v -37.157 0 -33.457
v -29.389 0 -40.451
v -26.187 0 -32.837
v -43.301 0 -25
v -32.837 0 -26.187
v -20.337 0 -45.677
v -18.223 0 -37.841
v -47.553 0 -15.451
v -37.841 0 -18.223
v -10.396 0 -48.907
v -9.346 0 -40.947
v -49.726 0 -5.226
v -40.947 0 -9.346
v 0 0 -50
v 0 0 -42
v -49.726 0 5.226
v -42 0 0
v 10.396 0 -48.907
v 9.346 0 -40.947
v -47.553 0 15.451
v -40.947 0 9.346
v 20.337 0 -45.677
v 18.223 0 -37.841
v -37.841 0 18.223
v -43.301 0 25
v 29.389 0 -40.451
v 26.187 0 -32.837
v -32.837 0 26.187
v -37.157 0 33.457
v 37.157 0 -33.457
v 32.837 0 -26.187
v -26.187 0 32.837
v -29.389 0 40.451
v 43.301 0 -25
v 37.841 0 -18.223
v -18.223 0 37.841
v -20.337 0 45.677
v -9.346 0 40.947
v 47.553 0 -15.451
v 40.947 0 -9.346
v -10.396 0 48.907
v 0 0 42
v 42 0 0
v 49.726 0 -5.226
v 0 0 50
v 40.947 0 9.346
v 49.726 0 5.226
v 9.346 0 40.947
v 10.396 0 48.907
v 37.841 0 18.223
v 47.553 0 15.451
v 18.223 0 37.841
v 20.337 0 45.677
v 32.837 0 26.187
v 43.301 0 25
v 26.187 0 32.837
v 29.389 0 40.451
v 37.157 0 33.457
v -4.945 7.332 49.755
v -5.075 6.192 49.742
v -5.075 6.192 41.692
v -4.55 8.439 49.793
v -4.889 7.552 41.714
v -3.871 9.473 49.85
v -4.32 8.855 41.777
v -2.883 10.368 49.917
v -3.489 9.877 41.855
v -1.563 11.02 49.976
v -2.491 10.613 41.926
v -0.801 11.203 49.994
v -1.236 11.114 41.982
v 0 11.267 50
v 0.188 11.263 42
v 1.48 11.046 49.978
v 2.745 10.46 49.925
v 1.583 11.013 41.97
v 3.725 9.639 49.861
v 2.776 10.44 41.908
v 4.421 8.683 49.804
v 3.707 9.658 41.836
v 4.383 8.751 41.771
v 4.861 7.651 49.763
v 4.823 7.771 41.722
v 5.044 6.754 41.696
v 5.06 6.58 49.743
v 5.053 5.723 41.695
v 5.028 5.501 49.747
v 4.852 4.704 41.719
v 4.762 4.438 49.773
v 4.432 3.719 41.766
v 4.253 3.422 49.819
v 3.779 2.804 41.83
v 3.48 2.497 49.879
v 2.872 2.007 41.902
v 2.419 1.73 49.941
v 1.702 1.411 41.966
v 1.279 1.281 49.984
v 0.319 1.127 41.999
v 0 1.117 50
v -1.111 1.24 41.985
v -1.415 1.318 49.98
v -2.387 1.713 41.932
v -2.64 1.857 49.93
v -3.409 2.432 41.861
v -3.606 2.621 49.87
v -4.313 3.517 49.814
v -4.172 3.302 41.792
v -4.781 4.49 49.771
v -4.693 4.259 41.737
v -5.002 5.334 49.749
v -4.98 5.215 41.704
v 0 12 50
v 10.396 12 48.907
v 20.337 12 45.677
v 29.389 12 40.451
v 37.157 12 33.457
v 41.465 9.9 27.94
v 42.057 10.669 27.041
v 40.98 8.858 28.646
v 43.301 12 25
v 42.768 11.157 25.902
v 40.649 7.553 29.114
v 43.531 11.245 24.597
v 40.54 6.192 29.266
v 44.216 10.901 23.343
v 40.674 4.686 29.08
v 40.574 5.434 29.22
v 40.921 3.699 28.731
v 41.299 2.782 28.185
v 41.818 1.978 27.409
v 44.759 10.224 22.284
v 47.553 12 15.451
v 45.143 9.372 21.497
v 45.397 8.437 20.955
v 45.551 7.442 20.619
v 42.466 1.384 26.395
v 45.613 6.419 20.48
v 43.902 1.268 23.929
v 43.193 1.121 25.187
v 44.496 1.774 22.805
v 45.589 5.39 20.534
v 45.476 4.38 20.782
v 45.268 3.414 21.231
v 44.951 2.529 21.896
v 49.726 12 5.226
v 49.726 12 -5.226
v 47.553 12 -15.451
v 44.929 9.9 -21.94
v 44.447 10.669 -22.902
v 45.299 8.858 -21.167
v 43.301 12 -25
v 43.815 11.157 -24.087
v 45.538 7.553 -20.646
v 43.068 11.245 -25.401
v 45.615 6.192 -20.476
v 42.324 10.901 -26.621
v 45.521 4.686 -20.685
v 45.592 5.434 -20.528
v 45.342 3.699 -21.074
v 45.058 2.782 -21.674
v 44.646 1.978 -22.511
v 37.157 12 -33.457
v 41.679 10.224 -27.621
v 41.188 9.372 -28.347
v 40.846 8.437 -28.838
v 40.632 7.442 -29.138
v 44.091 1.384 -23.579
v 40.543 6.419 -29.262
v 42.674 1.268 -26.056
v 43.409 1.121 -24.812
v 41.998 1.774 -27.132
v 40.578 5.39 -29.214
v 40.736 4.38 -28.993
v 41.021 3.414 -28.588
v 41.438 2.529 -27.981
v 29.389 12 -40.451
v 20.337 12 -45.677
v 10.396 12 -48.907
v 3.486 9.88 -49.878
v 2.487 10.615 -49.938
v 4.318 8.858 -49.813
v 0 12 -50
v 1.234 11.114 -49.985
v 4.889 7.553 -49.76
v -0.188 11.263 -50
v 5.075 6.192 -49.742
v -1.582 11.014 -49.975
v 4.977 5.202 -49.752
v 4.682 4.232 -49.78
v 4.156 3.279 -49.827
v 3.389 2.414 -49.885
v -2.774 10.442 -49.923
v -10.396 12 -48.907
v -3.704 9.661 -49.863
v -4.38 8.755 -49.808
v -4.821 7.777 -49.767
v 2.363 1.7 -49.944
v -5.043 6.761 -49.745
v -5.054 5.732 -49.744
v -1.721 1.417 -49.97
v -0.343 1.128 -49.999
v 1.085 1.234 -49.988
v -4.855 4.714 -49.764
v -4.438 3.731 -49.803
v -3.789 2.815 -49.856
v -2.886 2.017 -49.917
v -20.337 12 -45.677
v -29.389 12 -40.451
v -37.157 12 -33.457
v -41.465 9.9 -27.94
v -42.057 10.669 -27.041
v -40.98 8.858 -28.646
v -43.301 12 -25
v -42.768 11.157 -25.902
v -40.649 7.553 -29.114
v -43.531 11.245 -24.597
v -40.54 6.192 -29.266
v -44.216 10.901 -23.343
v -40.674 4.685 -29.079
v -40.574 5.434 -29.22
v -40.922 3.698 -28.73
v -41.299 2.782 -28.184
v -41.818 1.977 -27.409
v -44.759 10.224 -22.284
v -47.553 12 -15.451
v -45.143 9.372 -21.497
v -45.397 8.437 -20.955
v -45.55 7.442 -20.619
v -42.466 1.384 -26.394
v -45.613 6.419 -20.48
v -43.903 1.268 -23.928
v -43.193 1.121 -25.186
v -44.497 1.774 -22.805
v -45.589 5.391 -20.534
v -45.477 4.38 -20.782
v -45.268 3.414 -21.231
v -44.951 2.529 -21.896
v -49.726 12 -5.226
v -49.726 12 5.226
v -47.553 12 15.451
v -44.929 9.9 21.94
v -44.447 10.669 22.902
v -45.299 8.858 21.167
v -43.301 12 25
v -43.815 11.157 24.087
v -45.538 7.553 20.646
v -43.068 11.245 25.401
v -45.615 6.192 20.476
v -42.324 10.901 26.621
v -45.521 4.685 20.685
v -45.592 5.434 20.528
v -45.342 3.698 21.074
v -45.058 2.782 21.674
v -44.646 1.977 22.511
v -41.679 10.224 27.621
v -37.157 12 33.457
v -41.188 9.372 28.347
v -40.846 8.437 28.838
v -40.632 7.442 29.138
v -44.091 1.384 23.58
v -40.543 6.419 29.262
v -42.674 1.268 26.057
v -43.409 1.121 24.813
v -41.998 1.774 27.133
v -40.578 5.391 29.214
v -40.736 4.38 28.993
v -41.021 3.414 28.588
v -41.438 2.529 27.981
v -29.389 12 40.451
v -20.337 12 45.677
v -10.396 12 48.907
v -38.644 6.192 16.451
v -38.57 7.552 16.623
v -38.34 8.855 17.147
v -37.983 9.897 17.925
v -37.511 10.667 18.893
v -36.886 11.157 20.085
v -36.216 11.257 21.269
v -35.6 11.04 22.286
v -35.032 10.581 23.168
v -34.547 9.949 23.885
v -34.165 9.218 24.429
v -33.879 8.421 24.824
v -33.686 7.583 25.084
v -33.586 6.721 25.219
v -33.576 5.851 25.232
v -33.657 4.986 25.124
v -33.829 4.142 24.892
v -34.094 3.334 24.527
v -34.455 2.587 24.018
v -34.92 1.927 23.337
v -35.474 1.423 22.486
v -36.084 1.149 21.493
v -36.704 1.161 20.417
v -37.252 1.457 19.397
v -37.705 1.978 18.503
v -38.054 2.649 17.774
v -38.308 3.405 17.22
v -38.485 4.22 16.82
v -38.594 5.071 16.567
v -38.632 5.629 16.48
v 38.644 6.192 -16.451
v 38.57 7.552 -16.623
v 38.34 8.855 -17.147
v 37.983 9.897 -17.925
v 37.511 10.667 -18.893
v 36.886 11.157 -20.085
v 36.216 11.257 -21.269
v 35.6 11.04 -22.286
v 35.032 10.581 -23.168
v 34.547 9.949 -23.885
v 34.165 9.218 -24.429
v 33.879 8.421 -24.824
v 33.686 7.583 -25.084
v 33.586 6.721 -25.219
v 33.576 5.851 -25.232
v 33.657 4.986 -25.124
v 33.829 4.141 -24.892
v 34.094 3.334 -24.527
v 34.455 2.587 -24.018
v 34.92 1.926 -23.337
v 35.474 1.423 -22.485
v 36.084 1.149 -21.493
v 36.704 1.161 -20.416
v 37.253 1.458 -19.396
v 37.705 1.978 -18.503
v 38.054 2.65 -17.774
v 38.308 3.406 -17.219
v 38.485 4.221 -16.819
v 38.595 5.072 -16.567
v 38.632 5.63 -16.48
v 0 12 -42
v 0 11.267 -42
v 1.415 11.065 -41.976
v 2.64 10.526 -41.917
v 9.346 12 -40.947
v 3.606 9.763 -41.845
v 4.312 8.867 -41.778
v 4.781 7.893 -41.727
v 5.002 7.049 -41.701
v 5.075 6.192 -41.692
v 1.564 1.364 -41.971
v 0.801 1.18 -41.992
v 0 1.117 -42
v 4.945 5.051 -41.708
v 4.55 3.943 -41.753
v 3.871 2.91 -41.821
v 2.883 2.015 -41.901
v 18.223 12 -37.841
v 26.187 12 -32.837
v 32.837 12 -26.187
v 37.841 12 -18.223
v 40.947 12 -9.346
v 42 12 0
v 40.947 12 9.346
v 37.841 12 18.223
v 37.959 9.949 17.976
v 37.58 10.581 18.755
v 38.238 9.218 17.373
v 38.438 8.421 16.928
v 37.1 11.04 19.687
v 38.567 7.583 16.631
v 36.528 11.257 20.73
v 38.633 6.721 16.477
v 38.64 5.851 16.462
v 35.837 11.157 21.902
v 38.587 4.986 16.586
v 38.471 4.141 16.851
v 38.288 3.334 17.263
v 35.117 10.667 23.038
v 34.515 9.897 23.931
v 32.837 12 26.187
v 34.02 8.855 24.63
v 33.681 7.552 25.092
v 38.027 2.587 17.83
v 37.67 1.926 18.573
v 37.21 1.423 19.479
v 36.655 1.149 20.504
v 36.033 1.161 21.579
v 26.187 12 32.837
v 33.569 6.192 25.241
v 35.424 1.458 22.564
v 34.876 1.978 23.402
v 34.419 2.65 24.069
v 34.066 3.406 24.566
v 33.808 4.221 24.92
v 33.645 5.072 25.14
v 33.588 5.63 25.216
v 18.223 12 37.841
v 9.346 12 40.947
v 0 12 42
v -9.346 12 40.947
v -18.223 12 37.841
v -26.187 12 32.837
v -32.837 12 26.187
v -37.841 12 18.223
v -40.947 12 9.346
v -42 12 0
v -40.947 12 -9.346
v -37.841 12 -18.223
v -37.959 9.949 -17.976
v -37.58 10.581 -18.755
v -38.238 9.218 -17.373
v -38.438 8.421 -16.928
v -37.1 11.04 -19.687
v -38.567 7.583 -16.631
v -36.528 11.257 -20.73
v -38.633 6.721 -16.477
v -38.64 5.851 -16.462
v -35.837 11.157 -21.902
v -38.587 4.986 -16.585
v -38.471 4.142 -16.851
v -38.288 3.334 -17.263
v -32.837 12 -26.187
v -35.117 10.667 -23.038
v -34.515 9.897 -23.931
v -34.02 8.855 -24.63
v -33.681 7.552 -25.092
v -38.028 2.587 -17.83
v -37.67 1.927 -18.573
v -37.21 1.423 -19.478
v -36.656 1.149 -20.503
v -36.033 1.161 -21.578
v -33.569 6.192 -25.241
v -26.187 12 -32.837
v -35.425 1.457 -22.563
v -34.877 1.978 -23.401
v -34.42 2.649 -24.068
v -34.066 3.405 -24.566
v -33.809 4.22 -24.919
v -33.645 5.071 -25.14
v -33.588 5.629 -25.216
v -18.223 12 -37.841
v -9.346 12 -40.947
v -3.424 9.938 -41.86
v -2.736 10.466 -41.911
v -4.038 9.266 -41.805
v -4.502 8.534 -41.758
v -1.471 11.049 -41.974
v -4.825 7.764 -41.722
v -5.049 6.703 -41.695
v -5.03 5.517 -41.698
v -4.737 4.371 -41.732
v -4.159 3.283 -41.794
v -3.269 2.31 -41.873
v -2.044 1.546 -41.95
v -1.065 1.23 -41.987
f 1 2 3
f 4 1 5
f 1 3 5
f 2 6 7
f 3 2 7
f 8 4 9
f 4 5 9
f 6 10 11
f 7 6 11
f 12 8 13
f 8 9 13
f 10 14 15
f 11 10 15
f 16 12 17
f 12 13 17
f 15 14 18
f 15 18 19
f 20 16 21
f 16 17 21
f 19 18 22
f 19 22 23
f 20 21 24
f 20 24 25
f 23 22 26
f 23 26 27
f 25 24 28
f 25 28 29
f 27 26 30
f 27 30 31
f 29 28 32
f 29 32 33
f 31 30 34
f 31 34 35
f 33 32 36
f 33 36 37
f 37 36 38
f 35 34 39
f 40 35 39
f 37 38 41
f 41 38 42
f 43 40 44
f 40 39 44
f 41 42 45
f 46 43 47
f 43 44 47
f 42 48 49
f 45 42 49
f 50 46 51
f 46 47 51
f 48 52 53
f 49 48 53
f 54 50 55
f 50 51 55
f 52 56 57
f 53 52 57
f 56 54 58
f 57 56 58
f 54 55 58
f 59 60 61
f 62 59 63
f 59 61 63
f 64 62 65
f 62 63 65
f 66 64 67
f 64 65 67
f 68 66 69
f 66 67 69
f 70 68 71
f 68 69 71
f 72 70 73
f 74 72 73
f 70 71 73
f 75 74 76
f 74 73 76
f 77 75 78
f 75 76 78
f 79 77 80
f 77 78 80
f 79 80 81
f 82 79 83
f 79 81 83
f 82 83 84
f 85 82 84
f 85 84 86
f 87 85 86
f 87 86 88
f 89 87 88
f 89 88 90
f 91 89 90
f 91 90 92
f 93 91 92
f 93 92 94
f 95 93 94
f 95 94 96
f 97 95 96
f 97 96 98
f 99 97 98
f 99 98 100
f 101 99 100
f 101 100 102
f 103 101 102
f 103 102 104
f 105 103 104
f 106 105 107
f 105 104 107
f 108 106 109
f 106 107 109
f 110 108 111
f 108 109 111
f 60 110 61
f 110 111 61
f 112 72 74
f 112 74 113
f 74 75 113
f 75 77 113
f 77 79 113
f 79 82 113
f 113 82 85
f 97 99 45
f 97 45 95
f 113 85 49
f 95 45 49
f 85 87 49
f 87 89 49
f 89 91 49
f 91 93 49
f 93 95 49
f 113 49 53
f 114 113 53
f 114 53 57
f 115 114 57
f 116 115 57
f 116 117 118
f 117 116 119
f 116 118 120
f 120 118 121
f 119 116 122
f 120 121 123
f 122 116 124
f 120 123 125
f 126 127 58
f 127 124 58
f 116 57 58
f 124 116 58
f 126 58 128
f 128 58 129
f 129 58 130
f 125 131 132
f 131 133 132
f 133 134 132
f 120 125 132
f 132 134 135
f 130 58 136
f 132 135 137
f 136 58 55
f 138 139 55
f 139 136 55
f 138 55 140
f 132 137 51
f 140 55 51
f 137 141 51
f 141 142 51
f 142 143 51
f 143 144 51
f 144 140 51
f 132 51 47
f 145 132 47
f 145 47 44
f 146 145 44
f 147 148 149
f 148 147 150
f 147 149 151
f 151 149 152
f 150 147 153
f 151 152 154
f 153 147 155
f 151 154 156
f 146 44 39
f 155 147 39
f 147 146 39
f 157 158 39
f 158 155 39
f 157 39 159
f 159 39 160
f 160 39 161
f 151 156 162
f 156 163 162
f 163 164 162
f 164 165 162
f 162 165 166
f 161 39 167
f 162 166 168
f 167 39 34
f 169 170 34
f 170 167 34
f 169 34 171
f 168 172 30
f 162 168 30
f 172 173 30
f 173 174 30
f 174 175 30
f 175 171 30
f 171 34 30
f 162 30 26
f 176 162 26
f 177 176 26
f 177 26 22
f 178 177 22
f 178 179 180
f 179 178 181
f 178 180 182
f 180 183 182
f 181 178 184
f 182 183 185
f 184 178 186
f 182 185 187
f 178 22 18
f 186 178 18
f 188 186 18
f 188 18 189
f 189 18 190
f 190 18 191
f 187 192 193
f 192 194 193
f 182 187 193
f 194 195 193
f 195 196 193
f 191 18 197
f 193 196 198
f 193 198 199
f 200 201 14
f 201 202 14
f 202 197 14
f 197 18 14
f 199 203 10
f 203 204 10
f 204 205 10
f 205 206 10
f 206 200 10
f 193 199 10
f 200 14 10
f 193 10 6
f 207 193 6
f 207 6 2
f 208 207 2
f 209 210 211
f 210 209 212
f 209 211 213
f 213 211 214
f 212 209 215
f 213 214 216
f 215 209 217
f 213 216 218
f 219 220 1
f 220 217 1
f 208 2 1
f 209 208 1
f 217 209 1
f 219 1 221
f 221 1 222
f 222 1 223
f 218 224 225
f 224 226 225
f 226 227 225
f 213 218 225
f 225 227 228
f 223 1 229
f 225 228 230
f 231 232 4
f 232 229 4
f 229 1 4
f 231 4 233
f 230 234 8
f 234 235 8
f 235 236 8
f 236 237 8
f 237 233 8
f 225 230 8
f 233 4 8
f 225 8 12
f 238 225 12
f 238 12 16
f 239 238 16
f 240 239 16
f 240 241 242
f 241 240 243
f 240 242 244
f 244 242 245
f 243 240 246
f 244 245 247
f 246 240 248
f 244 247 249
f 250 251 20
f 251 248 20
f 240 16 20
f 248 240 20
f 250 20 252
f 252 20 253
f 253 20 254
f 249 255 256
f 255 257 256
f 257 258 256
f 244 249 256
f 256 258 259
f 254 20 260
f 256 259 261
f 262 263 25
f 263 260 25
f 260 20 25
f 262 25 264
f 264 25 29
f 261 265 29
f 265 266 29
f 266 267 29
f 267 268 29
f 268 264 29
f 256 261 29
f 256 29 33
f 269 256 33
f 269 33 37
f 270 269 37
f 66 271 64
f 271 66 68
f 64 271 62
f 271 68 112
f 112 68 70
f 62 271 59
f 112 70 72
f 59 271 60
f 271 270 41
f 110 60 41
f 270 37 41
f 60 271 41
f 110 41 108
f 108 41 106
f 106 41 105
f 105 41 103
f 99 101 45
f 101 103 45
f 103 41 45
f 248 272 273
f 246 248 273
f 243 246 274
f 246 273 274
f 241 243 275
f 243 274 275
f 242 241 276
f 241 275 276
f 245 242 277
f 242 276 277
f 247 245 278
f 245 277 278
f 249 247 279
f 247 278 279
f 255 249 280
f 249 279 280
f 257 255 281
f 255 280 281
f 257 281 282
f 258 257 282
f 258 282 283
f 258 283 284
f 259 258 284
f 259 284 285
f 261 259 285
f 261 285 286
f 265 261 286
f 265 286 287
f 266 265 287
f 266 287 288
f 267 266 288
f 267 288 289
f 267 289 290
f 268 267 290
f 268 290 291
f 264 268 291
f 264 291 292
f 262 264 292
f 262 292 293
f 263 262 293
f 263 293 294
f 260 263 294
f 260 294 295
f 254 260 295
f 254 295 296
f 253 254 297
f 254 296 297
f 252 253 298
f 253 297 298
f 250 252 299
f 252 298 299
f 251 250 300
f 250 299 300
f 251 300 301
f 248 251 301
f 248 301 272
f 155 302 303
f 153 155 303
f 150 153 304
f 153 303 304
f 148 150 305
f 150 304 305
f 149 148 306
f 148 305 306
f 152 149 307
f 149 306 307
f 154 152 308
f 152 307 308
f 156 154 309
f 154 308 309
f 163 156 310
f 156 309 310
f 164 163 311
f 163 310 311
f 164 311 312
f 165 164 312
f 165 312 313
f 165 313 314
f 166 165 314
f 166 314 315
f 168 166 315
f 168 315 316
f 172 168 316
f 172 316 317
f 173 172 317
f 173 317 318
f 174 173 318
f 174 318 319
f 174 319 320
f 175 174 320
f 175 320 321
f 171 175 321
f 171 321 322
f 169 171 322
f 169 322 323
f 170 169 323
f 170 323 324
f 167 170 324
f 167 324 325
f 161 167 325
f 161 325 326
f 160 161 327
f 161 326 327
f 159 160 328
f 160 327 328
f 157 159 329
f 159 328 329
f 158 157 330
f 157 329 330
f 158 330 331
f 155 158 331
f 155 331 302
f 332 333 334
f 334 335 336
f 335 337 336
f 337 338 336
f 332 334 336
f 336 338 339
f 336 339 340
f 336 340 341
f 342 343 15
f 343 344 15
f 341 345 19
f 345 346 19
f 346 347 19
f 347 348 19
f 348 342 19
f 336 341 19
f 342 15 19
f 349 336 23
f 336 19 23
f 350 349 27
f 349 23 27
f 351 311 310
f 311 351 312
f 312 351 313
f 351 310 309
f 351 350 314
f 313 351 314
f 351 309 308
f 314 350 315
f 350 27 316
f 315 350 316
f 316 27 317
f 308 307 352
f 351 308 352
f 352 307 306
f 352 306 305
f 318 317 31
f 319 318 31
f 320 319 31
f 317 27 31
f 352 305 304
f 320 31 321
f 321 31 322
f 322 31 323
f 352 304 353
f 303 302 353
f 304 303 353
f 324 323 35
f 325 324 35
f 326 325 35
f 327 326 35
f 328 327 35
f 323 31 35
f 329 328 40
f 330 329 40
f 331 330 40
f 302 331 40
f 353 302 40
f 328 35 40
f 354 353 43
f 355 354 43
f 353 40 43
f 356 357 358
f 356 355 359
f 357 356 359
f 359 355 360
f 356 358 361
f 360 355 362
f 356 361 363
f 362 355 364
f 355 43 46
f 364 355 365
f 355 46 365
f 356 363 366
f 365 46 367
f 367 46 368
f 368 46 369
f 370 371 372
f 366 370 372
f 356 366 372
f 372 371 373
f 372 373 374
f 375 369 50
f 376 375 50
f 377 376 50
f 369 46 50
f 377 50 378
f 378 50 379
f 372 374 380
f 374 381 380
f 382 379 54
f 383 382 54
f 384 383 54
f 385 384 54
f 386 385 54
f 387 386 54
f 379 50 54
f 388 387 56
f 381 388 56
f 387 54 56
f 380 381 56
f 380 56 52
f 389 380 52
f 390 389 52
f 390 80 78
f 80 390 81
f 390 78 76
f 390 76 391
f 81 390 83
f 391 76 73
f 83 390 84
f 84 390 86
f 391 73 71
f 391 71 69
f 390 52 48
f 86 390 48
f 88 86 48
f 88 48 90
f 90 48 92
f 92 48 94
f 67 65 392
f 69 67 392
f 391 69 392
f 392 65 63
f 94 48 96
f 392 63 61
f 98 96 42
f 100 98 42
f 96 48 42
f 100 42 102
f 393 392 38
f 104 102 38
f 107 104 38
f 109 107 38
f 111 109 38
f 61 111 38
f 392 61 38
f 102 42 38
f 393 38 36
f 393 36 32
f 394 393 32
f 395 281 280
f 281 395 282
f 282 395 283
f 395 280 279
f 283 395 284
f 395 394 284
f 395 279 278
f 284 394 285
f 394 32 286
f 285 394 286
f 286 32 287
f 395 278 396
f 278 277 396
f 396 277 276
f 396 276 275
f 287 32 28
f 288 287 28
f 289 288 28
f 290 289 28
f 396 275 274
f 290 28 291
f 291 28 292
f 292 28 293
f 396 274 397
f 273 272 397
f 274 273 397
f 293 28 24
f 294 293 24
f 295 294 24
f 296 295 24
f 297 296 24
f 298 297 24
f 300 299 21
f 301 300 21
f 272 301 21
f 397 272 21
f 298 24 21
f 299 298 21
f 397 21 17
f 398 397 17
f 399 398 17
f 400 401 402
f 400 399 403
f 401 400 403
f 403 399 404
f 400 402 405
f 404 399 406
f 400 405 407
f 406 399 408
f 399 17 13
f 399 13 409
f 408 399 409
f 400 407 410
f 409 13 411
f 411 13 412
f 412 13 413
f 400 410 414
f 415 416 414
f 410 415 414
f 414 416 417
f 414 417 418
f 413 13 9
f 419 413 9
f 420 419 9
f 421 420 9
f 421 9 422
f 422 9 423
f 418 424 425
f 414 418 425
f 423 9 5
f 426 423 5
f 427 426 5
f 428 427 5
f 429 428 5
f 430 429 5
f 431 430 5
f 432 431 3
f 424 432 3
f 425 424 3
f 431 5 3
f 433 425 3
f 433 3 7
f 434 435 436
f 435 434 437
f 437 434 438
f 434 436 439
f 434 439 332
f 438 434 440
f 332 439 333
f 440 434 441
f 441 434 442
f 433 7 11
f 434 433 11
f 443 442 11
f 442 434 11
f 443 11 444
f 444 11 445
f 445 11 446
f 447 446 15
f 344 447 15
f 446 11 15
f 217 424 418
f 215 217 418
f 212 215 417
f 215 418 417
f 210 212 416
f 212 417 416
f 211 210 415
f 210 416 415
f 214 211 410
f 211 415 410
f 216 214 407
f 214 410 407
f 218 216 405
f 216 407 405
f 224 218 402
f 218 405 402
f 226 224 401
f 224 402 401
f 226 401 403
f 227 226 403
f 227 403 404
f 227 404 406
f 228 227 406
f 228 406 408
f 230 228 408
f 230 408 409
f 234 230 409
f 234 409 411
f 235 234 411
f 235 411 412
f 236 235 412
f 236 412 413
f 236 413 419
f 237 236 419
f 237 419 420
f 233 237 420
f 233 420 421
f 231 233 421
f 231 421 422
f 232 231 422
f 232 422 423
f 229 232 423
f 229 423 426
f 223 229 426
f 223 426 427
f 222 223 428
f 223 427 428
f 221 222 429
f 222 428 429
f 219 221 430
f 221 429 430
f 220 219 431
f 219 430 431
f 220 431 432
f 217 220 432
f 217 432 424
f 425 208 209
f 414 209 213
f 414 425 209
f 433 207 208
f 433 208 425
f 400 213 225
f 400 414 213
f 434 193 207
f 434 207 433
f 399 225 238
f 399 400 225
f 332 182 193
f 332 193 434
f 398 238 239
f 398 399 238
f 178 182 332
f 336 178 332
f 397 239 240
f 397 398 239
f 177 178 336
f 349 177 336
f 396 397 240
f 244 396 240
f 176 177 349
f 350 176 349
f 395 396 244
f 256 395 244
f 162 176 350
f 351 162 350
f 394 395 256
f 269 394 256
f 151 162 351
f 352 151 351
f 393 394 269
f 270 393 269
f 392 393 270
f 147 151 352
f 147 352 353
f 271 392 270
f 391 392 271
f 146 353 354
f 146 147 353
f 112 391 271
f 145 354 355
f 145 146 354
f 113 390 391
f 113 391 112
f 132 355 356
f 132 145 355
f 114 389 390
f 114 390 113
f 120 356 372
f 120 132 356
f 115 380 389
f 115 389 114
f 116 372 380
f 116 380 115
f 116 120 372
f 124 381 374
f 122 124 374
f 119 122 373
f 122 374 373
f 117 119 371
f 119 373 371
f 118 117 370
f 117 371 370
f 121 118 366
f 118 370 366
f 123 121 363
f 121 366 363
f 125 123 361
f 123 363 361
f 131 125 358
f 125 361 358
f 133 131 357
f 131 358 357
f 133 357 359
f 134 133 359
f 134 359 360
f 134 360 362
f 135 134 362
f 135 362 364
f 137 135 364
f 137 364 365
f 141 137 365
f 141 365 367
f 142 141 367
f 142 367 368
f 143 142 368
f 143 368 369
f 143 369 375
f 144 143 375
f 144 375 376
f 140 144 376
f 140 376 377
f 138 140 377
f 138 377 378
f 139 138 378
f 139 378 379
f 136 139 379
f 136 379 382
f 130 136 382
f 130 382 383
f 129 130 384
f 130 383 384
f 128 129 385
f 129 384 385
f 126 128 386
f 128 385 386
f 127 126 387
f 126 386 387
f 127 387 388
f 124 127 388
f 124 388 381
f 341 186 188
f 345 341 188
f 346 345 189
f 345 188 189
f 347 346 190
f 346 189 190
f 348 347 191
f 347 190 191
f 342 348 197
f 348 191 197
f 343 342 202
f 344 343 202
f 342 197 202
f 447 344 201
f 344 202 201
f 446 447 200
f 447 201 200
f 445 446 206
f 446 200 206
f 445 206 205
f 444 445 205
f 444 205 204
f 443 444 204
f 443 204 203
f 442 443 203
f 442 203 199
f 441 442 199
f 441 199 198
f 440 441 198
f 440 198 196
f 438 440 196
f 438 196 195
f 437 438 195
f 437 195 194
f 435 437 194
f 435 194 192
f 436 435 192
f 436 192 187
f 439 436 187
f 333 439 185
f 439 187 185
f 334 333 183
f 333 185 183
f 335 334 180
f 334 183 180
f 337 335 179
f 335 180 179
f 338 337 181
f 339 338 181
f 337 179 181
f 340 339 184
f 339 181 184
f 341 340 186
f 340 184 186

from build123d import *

# Parameters (mm, degrees)
SKETCH_1_R               = 50
EXTRUDE_1_DEPTH          = 12
SKETCH_4_R               = 5.075
CUT_EXTRUDE_5_DEPTH      = 72.721684308
PATTERN_CIRCULAR_3_COUNT = 6
SKETCH_27_R              = 42
CUT_EXTRUDE_7_DEPTH      = 72.721684464


with BuildPart() as part:
    # 草图1 → 凸台-拉伸1 (new body)
    with BuildSketch(Plane(origin=(0, 0, 0), x_dir=(1, 0, 0), z_dir=(0, 1, 0))):
        with Locations(Location((0, 0, 0), (0, 0, 270))):
            Circle(SKETCH_1_R)
    extrude(amount=EXTRUDE_1_DEPTH)

    # 草图4 → 切除-拉伸5 (cut, through all)
    with BuildSketch(Plane.XY):
        with Locations((0, 6.19163712)):
            Circle(SKETCH_4_R)
    cut_extrude_5 = extrude(amount=-CUT_EXTRUDE_5_DEPTH, mode=Mode.SUBTRACT)

    # 阵列(圆周)3: 切除-拉伸5 ×6 about axis
    pattern_circular_3_axis = Axis((0, 0, 0), (0, 1, 0))
    for i in range(1, PATTERN_CIRCULAR_3_COUNT):
        add(cut_extrude_5.rotate(pattern_circular_3_axis, i * 360 / PATTERN_CIRCULAR_3_COUNT), mode=Mode.SUBTRACT)

    # 草图27 → 切除-拉伸7 (cut, through all)
    with BuildSketch(Plane.XZ):
        with Locations(Location((0, 0, 0), (0, 0, 270))):
            Circle(SKETCH_27_R)
    extrude(amount=-CUT_EXTRUDE_7_DEPTH, mode=Mode.SUBTRACT)


solid = part.part
